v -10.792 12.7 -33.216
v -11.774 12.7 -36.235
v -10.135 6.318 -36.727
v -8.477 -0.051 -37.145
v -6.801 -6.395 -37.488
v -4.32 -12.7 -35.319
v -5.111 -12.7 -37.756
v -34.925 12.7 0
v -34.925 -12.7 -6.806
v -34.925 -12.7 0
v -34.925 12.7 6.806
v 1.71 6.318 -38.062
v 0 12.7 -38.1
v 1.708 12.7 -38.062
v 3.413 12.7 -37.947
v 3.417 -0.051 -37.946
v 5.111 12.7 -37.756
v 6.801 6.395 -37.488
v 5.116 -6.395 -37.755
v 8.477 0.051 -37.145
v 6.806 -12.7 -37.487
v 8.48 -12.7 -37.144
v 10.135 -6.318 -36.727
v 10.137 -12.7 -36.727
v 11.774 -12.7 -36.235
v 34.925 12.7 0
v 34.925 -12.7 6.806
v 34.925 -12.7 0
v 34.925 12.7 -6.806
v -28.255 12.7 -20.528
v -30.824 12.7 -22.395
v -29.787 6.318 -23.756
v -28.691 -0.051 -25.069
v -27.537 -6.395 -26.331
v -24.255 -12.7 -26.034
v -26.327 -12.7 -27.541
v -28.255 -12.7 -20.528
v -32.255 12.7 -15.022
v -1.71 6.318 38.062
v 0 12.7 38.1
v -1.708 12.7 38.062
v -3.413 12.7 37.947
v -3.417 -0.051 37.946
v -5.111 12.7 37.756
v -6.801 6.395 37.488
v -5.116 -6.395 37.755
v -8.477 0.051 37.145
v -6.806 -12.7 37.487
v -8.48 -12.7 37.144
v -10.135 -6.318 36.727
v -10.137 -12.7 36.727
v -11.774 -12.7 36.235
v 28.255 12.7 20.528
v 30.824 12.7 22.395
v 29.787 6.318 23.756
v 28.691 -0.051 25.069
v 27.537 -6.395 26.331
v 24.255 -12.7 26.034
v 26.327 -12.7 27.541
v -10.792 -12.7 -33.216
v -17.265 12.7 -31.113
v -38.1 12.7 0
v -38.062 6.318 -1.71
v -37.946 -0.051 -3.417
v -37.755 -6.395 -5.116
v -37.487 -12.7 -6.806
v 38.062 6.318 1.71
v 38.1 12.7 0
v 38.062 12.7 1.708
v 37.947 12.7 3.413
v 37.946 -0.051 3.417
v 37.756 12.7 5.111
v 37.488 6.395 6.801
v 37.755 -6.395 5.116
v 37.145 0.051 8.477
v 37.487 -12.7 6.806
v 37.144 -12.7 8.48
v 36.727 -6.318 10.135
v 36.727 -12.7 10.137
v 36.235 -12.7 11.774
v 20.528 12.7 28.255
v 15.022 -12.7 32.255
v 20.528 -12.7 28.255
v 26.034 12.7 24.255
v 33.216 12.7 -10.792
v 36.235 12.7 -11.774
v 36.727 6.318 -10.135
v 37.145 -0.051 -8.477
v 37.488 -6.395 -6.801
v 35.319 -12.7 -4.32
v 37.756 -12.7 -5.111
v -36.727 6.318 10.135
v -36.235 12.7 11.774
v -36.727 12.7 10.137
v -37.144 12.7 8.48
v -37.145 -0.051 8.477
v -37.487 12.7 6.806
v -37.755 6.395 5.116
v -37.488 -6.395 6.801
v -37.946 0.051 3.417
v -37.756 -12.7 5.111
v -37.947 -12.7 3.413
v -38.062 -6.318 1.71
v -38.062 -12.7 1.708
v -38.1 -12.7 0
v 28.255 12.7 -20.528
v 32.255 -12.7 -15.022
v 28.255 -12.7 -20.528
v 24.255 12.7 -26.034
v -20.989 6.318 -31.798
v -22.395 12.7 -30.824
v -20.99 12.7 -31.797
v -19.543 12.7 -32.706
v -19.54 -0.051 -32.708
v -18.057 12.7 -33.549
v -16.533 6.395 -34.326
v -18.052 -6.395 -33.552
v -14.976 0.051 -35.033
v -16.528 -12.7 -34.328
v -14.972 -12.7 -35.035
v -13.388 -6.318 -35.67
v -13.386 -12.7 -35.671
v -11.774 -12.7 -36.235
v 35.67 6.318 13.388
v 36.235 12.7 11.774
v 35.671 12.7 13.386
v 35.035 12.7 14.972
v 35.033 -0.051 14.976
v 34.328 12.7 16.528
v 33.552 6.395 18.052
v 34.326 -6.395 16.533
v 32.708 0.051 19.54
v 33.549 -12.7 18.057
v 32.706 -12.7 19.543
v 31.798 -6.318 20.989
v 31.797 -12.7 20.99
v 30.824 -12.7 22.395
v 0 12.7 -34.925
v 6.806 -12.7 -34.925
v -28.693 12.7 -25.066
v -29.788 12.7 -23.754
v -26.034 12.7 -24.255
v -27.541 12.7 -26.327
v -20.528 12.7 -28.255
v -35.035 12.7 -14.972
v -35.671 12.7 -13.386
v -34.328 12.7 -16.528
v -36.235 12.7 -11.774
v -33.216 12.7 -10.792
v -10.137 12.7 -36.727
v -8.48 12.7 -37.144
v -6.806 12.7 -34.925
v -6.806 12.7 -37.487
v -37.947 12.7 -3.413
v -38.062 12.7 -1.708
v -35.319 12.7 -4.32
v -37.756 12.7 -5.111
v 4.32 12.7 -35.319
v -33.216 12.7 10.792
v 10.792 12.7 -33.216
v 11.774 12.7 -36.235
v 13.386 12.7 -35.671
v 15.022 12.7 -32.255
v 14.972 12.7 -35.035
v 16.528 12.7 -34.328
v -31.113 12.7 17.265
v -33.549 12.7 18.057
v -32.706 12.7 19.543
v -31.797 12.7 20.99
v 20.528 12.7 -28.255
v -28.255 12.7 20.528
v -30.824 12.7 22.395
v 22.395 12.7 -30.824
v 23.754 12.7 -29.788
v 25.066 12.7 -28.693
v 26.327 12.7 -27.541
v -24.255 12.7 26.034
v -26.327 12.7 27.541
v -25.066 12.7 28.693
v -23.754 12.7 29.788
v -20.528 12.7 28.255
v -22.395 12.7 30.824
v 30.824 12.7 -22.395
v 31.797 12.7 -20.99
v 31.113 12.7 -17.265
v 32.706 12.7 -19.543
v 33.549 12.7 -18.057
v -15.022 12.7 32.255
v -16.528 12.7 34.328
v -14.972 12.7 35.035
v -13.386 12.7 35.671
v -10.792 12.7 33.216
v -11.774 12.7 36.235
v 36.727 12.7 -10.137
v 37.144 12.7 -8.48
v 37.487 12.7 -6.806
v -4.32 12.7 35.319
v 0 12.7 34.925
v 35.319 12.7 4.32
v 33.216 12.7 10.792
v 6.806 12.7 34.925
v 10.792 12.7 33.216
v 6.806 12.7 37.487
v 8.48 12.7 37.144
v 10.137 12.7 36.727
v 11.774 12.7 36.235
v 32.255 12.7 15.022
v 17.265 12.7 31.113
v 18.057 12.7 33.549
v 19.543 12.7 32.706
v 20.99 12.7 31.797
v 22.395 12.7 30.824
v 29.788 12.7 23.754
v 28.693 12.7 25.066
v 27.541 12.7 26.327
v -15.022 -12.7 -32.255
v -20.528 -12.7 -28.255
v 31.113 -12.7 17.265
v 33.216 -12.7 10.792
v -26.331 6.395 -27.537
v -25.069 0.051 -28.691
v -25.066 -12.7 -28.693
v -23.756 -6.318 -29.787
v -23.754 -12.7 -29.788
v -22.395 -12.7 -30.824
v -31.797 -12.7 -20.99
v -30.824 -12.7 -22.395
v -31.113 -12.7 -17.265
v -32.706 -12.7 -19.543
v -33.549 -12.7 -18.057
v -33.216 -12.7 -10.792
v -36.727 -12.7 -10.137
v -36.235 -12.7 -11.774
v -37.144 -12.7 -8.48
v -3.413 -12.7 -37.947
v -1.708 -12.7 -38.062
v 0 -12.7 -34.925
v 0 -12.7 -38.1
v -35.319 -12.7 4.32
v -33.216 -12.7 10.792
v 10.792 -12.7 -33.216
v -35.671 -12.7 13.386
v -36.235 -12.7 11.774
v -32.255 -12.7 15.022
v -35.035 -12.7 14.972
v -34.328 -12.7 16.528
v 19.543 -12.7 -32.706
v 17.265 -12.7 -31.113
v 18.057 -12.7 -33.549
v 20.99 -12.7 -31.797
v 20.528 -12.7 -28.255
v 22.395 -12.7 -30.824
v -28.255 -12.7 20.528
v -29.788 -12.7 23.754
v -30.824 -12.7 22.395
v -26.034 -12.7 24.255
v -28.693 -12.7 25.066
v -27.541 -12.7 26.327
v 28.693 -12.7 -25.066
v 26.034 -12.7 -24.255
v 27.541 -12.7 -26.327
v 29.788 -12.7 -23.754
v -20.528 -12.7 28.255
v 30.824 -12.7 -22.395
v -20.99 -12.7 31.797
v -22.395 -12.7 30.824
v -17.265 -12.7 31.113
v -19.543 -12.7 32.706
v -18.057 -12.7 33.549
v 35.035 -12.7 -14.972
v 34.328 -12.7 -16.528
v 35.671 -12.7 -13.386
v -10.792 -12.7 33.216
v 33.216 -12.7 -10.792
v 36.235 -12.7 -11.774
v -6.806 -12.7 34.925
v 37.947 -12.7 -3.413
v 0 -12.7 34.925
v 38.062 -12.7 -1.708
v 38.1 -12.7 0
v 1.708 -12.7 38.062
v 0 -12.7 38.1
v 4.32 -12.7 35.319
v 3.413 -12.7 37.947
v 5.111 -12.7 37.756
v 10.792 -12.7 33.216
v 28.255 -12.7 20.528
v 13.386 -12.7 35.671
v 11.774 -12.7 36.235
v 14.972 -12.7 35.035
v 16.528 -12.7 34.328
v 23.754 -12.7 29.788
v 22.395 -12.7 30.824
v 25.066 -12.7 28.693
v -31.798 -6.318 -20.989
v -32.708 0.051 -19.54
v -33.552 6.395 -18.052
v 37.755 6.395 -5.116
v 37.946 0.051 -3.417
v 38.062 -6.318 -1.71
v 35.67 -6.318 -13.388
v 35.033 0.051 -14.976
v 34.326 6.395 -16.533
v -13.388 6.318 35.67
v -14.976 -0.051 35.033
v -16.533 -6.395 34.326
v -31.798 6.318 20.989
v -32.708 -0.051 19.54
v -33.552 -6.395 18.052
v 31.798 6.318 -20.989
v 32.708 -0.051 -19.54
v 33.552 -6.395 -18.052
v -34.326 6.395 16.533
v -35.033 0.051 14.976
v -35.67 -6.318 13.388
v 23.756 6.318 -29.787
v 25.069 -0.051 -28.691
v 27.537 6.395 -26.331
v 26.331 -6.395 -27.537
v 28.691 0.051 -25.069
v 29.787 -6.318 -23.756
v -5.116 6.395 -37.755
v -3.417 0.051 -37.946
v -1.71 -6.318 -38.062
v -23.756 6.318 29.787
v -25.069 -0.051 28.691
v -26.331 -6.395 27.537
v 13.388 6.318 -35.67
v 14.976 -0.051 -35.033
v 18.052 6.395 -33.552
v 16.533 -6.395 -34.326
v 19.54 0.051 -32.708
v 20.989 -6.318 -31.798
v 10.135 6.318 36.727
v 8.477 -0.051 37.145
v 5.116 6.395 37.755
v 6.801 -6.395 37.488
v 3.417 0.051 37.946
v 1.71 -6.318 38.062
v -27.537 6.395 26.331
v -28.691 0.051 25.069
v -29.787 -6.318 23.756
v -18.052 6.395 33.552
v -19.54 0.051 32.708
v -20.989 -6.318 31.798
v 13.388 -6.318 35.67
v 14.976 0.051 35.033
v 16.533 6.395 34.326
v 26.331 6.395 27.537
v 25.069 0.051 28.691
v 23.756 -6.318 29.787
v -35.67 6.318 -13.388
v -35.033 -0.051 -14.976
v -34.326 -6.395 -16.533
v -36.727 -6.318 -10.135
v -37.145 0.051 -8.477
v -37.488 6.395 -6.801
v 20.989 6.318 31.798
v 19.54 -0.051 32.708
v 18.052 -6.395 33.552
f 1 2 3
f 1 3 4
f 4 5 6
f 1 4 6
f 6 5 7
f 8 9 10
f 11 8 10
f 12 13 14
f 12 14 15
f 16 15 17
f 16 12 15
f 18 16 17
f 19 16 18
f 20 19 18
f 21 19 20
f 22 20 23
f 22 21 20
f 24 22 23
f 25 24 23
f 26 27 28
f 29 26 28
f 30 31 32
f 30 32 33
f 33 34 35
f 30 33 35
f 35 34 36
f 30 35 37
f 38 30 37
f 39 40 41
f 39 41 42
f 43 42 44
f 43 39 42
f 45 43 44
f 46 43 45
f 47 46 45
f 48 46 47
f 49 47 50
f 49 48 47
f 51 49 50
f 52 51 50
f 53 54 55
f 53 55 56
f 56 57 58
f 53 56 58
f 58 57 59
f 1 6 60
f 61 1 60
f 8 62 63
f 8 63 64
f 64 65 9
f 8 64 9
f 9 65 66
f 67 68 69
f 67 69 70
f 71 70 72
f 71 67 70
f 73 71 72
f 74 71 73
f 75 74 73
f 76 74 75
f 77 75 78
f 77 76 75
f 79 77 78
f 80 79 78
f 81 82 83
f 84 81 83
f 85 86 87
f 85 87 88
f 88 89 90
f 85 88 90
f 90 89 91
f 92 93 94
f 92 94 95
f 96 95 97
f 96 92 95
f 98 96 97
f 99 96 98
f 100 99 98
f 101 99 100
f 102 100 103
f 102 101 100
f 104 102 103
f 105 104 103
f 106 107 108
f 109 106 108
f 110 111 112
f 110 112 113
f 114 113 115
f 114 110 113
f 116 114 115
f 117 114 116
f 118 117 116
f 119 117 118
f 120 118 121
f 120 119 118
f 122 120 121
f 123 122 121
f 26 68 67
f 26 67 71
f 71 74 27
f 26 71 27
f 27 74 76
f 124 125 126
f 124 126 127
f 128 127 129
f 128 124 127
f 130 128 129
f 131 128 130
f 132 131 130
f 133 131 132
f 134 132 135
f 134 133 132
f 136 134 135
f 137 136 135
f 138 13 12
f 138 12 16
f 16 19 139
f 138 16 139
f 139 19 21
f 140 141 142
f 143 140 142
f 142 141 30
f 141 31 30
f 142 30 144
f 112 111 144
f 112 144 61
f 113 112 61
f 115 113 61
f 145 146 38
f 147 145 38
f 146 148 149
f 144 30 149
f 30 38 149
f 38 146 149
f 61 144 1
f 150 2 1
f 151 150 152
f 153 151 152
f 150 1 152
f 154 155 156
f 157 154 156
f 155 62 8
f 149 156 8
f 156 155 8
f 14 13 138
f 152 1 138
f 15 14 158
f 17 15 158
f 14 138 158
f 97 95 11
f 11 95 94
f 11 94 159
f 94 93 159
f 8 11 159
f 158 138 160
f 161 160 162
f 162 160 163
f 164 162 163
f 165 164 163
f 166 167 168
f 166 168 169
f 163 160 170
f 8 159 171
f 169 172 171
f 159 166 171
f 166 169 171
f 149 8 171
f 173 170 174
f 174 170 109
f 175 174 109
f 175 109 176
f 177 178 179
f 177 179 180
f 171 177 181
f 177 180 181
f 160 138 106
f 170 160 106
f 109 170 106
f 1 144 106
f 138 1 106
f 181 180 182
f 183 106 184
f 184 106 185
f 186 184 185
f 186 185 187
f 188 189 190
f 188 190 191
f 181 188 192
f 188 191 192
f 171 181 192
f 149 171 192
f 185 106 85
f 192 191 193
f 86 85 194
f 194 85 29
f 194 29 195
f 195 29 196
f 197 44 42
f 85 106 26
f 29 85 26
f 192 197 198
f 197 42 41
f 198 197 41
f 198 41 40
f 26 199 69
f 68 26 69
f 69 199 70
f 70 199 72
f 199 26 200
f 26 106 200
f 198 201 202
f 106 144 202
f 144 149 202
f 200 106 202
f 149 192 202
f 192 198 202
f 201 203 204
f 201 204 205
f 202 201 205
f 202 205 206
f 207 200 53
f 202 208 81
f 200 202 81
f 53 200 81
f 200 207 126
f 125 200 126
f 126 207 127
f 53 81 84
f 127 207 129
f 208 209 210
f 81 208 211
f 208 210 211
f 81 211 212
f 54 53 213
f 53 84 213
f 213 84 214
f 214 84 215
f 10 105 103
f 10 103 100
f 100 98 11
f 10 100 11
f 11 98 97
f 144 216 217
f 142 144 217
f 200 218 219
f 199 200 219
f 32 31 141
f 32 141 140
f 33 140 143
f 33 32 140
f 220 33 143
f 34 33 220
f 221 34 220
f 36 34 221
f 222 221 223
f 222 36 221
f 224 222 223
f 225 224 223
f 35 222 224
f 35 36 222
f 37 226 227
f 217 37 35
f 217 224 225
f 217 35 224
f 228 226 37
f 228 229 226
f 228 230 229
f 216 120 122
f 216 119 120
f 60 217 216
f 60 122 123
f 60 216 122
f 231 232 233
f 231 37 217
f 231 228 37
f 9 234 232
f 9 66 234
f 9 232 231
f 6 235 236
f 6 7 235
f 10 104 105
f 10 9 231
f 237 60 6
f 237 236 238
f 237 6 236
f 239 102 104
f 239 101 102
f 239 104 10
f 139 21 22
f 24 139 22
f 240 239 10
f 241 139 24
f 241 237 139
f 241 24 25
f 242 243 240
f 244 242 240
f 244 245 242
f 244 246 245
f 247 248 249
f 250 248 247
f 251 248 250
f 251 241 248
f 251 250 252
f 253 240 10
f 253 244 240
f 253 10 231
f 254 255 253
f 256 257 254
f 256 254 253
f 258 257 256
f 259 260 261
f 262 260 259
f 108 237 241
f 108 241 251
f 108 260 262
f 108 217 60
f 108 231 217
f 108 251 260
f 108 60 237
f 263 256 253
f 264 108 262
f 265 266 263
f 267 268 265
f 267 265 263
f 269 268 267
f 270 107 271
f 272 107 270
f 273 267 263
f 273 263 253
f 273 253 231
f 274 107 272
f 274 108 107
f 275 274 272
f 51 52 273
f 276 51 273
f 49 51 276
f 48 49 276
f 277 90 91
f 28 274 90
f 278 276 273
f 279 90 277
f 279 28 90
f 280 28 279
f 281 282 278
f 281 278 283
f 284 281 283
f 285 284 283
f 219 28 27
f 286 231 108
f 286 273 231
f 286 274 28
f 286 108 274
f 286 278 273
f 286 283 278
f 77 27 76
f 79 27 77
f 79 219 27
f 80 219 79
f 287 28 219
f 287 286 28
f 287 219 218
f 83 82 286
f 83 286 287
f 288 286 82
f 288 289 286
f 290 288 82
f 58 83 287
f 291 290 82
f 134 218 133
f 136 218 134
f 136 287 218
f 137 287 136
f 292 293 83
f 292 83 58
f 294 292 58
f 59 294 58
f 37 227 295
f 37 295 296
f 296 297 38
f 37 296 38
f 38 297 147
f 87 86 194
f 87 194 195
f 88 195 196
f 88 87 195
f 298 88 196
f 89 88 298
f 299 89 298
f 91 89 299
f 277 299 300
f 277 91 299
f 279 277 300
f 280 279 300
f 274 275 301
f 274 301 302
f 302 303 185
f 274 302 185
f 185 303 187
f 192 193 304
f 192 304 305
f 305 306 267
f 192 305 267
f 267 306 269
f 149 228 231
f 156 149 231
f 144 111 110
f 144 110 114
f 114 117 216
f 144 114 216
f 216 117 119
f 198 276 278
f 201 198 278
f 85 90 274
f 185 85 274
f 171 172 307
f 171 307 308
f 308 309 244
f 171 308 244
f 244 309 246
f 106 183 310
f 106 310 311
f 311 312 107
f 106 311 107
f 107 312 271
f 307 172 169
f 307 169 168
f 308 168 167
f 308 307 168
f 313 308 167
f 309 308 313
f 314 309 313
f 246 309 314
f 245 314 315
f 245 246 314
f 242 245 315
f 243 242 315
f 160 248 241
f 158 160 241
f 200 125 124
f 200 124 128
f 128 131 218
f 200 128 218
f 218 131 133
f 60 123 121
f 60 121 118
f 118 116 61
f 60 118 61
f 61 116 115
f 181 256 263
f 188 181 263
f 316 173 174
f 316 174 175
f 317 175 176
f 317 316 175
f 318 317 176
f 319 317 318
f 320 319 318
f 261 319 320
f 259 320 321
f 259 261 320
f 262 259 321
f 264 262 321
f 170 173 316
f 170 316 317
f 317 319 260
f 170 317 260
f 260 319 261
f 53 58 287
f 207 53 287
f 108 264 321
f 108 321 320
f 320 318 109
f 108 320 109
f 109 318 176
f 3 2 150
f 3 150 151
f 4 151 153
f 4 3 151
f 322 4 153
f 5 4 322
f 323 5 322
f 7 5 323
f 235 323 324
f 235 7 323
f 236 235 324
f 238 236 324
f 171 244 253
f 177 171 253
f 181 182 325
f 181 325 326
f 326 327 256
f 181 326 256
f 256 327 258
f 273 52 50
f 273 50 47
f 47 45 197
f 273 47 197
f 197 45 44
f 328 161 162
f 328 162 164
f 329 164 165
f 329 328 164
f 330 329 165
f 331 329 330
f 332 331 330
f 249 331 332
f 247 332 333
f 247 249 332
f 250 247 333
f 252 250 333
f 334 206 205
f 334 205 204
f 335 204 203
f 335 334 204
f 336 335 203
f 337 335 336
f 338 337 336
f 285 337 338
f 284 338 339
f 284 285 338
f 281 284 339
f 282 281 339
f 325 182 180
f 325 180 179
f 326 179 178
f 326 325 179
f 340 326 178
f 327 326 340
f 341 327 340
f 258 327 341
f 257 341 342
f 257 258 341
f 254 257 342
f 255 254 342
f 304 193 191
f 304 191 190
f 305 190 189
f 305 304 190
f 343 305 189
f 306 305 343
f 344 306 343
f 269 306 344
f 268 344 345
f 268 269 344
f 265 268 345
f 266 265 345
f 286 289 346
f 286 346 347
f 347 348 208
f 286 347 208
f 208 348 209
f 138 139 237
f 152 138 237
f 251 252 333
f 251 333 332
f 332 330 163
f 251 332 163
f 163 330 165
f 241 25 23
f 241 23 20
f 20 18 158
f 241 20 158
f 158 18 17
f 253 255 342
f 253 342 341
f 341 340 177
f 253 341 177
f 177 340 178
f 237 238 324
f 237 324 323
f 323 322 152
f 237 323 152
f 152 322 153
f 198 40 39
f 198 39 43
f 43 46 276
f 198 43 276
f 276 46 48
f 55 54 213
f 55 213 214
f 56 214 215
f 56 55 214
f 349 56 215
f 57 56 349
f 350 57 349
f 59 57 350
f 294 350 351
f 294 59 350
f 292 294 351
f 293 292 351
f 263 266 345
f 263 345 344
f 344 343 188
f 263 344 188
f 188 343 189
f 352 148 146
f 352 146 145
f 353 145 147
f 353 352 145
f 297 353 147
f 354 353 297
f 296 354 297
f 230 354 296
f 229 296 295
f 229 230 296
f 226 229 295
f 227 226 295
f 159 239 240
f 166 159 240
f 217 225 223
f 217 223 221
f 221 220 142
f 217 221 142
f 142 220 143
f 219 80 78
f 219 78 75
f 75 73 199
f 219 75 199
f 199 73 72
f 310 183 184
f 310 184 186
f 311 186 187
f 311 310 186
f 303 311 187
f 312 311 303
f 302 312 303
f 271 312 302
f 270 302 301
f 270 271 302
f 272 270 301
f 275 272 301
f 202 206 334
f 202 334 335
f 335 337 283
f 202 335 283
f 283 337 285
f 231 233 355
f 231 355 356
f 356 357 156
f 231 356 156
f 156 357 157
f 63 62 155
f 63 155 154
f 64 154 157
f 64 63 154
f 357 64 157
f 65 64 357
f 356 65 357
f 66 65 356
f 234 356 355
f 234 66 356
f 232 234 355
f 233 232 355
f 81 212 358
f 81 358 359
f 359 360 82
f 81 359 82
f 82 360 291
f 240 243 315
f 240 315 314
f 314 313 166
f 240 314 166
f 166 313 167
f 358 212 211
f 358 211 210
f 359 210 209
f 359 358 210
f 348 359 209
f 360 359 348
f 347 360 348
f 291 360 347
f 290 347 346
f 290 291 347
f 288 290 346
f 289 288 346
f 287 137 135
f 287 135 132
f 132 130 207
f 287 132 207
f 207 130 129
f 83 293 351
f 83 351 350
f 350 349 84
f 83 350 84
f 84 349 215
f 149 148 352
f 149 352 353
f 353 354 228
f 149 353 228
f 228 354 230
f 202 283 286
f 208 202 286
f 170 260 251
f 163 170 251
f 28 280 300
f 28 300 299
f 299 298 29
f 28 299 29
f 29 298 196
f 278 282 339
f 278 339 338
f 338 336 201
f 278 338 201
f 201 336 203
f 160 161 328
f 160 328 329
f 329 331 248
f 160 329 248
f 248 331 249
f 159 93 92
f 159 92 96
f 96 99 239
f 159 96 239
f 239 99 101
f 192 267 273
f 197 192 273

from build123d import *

# Parameters (mm, degrees)
F0_R            = 38.1
F1_DEPTH        = 12.7
F4_DEPTH        = 3.175
F4_COPIES_COUNT = 20


# Not quite as in the source:
# - a pattern or mirror of a feature is missing from the dataset's text; its kind, count and spacing are read off the source's solid


with BuildPart() as f1:
    # F0 (on Front) → F1 (new body, symmetric)
    with BuildSketch(Plane.XZ):
        Circle(F0_R)
    extrude(amount=F1_DEPTH, both=True)

    # F3 (on offset) → F4 (cut)
    with BuildSketch(Plane.XY.offset(38.1)):
        Polygon((-6.8059094878, -12.7), (0, -12.7), (6.8059094878, 12.7), (0, 12.7), align=None)
    f4 = extrude(amount=-F4_DEPTH, mode=Mode.SUBTRACT)

    # F4_copies: F4 ×20 about axis
    f4_copies_axis = Axis((0, 0, 0), (0, 1, 0))
    for i in range(1, F4_COPIES_COUNT):
        add(f4.rotate(f4_copies_axis, i * 360 / F4_COPIES_COUNT), mode=Mode.SUBTRACT)


solid = f1.part
